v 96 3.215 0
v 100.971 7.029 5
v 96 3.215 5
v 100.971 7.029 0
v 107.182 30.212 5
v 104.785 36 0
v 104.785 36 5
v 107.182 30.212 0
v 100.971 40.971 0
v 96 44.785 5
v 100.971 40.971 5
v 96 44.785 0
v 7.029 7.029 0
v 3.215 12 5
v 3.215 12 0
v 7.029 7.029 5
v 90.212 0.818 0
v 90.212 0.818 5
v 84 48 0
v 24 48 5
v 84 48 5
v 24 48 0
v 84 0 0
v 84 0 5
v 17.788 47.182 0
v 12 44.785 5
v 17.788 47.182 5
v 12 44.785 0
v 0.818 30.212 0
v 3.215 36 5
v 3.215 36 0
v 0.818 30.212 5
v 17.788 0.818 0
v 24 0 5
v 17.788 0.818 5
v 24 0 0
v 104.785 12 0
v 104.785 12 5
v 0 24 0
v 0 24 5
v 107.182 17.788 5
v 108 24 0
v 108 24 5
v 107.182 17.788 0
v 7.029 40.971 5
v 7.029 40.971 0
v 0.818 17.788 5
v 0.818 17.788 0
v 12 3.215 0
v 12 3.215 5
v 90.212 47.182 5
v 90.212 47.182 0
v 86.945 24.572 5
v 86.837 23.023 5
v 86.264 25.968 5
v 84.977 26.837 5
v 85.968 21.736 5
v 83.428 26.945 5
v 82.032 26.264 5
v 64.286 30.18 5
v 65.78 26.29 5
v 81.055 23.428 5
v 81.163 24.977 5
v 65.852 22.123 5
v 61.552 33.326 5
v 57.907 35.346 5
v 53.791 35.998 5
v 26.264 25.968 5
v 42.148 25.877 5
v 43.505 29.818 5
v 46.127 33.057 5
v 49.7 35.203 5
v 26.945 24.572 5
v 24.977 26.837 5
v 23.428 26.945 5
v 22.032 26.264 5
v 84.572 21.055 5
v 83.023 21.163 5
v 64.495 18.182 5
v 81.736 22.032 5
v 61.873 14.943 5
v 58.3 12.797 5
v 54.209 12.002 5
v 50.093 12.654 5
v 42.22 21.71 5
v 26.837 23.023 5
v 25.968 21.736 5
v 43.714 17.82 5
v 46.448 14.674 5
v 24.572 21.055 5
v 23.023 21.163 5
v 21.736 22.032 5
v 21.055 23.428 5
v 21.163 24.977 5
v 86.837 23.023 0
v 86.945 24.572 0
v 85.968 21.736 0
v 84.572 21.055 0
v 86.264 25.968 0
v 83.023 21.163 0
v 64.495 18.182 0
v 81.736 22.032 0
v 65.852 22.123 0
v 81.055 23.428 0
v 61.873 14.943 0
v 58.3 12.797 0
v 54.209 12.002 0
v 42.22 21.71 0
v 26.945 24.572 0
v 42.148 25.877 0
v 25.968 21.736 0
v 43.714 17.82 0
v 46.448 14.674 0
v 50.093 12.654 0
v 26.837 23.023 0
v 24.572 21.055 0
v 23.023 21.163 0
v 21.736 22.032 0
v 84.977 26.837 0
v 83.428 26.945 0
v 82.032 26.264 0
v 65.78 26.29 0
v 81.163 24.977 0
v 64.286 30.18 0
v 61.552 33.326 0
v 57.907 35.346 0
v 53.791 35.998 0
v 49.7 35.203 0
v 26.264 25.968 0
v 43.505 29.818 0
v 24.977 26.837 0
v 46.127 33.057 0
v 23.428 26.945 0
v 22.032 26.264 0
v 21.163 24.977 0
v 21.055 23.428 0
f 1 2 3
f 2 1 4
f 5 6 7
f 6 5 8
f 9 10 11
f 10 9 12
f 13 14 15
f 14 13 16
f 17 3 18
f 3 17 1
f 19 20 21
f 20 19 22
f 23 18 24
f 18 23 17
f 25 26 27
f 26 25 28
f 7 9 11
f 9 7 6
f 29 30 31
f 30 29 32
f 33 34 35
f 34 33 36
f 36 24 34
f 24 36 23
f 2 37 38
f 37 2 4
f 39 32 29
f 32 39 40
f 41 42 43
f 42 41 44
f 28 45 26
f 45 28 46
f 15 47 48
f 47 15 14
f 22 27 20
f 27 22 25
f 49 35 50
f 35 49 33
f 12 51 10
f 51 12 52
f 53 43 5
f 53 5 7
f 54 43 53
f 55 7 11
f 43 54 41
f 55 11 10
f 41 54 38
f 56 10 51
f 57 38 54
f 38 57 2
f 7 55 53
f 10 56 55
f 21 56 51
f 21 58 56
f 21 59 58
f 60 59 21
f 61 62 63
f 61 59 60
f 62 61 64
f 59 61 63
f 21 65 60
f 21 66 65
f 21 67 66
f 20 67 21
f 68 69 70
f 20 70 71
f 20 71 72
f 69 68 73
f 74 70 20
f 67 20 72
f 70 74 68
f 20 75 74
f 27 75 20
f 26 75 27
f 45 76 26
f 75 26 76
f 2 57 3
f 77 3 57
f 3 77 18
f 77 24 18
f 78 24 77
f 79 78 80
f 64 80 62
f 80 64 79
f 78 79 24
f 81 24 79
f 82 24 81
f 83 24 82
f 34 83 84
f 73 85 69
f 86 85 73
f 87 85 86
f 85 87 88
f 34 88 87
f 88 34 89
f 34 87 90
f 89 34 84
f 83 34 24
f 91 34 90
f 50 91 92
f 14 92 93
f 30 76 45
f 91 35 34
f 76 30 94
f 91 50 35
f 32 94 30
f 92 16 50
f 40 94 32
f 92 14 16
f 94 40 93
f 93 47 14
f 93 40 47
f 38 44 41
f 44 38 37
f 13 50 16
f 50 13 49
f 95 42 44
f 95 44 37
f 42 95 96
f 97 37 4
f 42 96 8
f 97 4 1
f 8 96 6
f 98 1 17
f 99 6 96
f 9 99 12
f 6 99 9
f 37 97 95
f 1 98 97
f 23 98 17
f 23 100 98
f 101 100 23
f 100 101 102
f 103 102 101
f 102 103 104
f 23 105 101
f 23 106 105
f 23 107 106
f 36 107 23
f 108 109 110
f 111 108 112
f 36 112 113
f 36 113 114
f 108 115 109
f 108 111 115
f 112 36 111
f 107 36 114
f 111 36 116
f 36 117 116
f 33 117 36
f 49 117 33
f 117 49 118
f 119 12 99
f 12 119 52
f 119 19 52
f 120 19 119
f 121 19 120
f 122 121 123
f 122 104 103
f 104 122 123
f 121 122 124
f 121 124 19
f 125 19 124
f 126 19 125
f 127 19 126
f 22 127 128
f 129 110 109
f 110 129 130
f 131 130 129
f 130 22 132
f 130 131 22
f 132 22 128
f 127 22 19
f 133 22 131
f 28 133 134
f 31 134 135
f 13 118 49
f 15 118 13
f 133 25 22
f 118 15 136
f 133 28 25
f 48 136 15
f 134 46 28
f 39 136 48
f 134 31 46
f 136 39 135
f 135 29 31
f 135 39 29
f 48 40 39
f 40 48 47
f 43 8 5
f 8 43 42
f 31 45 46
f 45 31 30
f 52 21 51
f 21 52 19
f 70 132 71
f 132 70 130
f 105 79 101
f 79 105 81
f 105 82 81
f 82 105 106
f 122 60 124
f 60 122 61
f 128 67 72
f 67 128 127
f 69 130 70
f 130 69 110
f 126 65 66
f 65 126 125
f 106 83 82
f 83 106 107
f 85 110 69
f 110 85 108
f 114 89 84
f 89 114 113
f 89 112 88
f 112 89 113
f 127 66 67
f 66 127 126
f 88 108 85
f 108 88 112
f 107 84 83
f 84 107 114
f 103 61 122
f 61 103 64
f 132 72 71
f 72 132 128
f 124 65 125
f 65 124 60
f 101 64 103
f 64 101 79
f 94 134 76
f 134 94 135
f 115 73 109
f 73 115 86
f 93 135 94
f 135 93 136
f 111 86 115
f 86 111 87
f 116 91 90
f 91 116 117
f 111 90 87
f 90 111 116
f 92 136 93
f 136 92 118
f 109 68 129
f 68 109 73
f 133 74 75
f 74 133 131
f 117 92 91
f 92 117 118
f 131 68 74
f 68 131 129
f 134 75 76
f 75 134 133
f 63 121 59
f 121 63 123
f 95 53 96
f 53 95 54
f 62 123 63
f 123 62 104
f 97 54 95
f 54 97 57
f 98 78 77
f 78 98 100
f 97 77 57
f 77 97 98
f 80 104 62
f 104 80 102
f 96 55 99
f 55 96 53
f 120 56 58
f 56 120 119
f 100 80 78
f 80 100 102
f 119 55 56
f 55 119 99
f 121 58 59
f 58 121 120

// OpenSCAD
$fn = 32;

// ----------------------------------------------------------------------
// Spacer plate: obround span 60, caps R24
// ----------------------------------------------------------------------

// --- parameters (mm) ---
bore_r = 12;              // centre bore radius
bolt_r = 3;               // bolt hole radius
plate_t = 5;              // plate thickness, Z (extrusion height)
span = 60;                // obround span
cap_r = 24;               // cap radius
fit_tol = 0.02;           // declared fit tolerance (prompt contract)
free_tol = 0.2;           // declared free tolerance (prompt contract)

profile = [[24, 48], [17.788, 47.182], [12, 44.785], [7.029, 40.971], [3.215, 36], [0.818, 30.212], [0, 24], [0.818, 17.788], [3.215, 12], [7.029, 7.029], [12, 3.215], [17.788, 0.818], [24, 0], [84, 0], [90.212, 0.818], [96, 3.215], [100.971, 7.029], [104.785, 12], [107.182, 17.788], [108, 24], [107.182, 30.212], [104.785, 36], [100.971, 40.971], [96, 44.785], [90.212, 47.182], [84, 48]];  // primary outline, 26 points, counter clockwise
void_1 = [[65.78, 26.29], [64.286, 30.18], [61.552, 33.326], [57.907, 35.346], [53.791, 35.998], [49.7, 35.203], [46.127, 33.057], [43.505, 29.818], [42.148, 25.877], [42.22, 21.71], [43.714, 17.82], [46.448, 14.674], [50.093, 12.654], [54.209, 12.002], [58.3, 12.797], [61.873, 14.943], [64.495, 18.182], [65.852, 22.123]];  // centre bore, 18 points
void_2 = [[26.945, 24.572], [26.264, 25.968], [24.977, 26.837], [23.428, 26.945], [22.032, 26.264], [21.163, 24.977], [21.055, 23.428], [21.736, 22.032], [23.023, 21.163], [24.572, 21.055], [25.968, 21.736], [26.837, 23.023]];  // end hole, 12 points
void_3 = [[86.945, 24.572], [86.264, 25.968], [84.977, 26.837], [83.428, 26.945], [82.032, 26.264], [81.163, 24.977], [81.055, 23.428], [81.736, 22.032], [83.023, 21.163], [84.572, 21.055], [85.968, 21.736], [86.837, 23.023]];  // end hole, 12 points

// --- the one profile operation ---
difference() {
  linear_extrude(height = plate_t) polygon(points = profile);
  translate([0, 0, -1])
    linear_extrude(height = plate_t + 2) polygon(points = void_1);
  translate([0, 0, -1])
    linear_extrude(height = plate_t + 2) polygon(points = void_2);
  translate([0, 0, -1])
    linear_extrude(height = plate_t + 2) polygon(points = void_3);
}
